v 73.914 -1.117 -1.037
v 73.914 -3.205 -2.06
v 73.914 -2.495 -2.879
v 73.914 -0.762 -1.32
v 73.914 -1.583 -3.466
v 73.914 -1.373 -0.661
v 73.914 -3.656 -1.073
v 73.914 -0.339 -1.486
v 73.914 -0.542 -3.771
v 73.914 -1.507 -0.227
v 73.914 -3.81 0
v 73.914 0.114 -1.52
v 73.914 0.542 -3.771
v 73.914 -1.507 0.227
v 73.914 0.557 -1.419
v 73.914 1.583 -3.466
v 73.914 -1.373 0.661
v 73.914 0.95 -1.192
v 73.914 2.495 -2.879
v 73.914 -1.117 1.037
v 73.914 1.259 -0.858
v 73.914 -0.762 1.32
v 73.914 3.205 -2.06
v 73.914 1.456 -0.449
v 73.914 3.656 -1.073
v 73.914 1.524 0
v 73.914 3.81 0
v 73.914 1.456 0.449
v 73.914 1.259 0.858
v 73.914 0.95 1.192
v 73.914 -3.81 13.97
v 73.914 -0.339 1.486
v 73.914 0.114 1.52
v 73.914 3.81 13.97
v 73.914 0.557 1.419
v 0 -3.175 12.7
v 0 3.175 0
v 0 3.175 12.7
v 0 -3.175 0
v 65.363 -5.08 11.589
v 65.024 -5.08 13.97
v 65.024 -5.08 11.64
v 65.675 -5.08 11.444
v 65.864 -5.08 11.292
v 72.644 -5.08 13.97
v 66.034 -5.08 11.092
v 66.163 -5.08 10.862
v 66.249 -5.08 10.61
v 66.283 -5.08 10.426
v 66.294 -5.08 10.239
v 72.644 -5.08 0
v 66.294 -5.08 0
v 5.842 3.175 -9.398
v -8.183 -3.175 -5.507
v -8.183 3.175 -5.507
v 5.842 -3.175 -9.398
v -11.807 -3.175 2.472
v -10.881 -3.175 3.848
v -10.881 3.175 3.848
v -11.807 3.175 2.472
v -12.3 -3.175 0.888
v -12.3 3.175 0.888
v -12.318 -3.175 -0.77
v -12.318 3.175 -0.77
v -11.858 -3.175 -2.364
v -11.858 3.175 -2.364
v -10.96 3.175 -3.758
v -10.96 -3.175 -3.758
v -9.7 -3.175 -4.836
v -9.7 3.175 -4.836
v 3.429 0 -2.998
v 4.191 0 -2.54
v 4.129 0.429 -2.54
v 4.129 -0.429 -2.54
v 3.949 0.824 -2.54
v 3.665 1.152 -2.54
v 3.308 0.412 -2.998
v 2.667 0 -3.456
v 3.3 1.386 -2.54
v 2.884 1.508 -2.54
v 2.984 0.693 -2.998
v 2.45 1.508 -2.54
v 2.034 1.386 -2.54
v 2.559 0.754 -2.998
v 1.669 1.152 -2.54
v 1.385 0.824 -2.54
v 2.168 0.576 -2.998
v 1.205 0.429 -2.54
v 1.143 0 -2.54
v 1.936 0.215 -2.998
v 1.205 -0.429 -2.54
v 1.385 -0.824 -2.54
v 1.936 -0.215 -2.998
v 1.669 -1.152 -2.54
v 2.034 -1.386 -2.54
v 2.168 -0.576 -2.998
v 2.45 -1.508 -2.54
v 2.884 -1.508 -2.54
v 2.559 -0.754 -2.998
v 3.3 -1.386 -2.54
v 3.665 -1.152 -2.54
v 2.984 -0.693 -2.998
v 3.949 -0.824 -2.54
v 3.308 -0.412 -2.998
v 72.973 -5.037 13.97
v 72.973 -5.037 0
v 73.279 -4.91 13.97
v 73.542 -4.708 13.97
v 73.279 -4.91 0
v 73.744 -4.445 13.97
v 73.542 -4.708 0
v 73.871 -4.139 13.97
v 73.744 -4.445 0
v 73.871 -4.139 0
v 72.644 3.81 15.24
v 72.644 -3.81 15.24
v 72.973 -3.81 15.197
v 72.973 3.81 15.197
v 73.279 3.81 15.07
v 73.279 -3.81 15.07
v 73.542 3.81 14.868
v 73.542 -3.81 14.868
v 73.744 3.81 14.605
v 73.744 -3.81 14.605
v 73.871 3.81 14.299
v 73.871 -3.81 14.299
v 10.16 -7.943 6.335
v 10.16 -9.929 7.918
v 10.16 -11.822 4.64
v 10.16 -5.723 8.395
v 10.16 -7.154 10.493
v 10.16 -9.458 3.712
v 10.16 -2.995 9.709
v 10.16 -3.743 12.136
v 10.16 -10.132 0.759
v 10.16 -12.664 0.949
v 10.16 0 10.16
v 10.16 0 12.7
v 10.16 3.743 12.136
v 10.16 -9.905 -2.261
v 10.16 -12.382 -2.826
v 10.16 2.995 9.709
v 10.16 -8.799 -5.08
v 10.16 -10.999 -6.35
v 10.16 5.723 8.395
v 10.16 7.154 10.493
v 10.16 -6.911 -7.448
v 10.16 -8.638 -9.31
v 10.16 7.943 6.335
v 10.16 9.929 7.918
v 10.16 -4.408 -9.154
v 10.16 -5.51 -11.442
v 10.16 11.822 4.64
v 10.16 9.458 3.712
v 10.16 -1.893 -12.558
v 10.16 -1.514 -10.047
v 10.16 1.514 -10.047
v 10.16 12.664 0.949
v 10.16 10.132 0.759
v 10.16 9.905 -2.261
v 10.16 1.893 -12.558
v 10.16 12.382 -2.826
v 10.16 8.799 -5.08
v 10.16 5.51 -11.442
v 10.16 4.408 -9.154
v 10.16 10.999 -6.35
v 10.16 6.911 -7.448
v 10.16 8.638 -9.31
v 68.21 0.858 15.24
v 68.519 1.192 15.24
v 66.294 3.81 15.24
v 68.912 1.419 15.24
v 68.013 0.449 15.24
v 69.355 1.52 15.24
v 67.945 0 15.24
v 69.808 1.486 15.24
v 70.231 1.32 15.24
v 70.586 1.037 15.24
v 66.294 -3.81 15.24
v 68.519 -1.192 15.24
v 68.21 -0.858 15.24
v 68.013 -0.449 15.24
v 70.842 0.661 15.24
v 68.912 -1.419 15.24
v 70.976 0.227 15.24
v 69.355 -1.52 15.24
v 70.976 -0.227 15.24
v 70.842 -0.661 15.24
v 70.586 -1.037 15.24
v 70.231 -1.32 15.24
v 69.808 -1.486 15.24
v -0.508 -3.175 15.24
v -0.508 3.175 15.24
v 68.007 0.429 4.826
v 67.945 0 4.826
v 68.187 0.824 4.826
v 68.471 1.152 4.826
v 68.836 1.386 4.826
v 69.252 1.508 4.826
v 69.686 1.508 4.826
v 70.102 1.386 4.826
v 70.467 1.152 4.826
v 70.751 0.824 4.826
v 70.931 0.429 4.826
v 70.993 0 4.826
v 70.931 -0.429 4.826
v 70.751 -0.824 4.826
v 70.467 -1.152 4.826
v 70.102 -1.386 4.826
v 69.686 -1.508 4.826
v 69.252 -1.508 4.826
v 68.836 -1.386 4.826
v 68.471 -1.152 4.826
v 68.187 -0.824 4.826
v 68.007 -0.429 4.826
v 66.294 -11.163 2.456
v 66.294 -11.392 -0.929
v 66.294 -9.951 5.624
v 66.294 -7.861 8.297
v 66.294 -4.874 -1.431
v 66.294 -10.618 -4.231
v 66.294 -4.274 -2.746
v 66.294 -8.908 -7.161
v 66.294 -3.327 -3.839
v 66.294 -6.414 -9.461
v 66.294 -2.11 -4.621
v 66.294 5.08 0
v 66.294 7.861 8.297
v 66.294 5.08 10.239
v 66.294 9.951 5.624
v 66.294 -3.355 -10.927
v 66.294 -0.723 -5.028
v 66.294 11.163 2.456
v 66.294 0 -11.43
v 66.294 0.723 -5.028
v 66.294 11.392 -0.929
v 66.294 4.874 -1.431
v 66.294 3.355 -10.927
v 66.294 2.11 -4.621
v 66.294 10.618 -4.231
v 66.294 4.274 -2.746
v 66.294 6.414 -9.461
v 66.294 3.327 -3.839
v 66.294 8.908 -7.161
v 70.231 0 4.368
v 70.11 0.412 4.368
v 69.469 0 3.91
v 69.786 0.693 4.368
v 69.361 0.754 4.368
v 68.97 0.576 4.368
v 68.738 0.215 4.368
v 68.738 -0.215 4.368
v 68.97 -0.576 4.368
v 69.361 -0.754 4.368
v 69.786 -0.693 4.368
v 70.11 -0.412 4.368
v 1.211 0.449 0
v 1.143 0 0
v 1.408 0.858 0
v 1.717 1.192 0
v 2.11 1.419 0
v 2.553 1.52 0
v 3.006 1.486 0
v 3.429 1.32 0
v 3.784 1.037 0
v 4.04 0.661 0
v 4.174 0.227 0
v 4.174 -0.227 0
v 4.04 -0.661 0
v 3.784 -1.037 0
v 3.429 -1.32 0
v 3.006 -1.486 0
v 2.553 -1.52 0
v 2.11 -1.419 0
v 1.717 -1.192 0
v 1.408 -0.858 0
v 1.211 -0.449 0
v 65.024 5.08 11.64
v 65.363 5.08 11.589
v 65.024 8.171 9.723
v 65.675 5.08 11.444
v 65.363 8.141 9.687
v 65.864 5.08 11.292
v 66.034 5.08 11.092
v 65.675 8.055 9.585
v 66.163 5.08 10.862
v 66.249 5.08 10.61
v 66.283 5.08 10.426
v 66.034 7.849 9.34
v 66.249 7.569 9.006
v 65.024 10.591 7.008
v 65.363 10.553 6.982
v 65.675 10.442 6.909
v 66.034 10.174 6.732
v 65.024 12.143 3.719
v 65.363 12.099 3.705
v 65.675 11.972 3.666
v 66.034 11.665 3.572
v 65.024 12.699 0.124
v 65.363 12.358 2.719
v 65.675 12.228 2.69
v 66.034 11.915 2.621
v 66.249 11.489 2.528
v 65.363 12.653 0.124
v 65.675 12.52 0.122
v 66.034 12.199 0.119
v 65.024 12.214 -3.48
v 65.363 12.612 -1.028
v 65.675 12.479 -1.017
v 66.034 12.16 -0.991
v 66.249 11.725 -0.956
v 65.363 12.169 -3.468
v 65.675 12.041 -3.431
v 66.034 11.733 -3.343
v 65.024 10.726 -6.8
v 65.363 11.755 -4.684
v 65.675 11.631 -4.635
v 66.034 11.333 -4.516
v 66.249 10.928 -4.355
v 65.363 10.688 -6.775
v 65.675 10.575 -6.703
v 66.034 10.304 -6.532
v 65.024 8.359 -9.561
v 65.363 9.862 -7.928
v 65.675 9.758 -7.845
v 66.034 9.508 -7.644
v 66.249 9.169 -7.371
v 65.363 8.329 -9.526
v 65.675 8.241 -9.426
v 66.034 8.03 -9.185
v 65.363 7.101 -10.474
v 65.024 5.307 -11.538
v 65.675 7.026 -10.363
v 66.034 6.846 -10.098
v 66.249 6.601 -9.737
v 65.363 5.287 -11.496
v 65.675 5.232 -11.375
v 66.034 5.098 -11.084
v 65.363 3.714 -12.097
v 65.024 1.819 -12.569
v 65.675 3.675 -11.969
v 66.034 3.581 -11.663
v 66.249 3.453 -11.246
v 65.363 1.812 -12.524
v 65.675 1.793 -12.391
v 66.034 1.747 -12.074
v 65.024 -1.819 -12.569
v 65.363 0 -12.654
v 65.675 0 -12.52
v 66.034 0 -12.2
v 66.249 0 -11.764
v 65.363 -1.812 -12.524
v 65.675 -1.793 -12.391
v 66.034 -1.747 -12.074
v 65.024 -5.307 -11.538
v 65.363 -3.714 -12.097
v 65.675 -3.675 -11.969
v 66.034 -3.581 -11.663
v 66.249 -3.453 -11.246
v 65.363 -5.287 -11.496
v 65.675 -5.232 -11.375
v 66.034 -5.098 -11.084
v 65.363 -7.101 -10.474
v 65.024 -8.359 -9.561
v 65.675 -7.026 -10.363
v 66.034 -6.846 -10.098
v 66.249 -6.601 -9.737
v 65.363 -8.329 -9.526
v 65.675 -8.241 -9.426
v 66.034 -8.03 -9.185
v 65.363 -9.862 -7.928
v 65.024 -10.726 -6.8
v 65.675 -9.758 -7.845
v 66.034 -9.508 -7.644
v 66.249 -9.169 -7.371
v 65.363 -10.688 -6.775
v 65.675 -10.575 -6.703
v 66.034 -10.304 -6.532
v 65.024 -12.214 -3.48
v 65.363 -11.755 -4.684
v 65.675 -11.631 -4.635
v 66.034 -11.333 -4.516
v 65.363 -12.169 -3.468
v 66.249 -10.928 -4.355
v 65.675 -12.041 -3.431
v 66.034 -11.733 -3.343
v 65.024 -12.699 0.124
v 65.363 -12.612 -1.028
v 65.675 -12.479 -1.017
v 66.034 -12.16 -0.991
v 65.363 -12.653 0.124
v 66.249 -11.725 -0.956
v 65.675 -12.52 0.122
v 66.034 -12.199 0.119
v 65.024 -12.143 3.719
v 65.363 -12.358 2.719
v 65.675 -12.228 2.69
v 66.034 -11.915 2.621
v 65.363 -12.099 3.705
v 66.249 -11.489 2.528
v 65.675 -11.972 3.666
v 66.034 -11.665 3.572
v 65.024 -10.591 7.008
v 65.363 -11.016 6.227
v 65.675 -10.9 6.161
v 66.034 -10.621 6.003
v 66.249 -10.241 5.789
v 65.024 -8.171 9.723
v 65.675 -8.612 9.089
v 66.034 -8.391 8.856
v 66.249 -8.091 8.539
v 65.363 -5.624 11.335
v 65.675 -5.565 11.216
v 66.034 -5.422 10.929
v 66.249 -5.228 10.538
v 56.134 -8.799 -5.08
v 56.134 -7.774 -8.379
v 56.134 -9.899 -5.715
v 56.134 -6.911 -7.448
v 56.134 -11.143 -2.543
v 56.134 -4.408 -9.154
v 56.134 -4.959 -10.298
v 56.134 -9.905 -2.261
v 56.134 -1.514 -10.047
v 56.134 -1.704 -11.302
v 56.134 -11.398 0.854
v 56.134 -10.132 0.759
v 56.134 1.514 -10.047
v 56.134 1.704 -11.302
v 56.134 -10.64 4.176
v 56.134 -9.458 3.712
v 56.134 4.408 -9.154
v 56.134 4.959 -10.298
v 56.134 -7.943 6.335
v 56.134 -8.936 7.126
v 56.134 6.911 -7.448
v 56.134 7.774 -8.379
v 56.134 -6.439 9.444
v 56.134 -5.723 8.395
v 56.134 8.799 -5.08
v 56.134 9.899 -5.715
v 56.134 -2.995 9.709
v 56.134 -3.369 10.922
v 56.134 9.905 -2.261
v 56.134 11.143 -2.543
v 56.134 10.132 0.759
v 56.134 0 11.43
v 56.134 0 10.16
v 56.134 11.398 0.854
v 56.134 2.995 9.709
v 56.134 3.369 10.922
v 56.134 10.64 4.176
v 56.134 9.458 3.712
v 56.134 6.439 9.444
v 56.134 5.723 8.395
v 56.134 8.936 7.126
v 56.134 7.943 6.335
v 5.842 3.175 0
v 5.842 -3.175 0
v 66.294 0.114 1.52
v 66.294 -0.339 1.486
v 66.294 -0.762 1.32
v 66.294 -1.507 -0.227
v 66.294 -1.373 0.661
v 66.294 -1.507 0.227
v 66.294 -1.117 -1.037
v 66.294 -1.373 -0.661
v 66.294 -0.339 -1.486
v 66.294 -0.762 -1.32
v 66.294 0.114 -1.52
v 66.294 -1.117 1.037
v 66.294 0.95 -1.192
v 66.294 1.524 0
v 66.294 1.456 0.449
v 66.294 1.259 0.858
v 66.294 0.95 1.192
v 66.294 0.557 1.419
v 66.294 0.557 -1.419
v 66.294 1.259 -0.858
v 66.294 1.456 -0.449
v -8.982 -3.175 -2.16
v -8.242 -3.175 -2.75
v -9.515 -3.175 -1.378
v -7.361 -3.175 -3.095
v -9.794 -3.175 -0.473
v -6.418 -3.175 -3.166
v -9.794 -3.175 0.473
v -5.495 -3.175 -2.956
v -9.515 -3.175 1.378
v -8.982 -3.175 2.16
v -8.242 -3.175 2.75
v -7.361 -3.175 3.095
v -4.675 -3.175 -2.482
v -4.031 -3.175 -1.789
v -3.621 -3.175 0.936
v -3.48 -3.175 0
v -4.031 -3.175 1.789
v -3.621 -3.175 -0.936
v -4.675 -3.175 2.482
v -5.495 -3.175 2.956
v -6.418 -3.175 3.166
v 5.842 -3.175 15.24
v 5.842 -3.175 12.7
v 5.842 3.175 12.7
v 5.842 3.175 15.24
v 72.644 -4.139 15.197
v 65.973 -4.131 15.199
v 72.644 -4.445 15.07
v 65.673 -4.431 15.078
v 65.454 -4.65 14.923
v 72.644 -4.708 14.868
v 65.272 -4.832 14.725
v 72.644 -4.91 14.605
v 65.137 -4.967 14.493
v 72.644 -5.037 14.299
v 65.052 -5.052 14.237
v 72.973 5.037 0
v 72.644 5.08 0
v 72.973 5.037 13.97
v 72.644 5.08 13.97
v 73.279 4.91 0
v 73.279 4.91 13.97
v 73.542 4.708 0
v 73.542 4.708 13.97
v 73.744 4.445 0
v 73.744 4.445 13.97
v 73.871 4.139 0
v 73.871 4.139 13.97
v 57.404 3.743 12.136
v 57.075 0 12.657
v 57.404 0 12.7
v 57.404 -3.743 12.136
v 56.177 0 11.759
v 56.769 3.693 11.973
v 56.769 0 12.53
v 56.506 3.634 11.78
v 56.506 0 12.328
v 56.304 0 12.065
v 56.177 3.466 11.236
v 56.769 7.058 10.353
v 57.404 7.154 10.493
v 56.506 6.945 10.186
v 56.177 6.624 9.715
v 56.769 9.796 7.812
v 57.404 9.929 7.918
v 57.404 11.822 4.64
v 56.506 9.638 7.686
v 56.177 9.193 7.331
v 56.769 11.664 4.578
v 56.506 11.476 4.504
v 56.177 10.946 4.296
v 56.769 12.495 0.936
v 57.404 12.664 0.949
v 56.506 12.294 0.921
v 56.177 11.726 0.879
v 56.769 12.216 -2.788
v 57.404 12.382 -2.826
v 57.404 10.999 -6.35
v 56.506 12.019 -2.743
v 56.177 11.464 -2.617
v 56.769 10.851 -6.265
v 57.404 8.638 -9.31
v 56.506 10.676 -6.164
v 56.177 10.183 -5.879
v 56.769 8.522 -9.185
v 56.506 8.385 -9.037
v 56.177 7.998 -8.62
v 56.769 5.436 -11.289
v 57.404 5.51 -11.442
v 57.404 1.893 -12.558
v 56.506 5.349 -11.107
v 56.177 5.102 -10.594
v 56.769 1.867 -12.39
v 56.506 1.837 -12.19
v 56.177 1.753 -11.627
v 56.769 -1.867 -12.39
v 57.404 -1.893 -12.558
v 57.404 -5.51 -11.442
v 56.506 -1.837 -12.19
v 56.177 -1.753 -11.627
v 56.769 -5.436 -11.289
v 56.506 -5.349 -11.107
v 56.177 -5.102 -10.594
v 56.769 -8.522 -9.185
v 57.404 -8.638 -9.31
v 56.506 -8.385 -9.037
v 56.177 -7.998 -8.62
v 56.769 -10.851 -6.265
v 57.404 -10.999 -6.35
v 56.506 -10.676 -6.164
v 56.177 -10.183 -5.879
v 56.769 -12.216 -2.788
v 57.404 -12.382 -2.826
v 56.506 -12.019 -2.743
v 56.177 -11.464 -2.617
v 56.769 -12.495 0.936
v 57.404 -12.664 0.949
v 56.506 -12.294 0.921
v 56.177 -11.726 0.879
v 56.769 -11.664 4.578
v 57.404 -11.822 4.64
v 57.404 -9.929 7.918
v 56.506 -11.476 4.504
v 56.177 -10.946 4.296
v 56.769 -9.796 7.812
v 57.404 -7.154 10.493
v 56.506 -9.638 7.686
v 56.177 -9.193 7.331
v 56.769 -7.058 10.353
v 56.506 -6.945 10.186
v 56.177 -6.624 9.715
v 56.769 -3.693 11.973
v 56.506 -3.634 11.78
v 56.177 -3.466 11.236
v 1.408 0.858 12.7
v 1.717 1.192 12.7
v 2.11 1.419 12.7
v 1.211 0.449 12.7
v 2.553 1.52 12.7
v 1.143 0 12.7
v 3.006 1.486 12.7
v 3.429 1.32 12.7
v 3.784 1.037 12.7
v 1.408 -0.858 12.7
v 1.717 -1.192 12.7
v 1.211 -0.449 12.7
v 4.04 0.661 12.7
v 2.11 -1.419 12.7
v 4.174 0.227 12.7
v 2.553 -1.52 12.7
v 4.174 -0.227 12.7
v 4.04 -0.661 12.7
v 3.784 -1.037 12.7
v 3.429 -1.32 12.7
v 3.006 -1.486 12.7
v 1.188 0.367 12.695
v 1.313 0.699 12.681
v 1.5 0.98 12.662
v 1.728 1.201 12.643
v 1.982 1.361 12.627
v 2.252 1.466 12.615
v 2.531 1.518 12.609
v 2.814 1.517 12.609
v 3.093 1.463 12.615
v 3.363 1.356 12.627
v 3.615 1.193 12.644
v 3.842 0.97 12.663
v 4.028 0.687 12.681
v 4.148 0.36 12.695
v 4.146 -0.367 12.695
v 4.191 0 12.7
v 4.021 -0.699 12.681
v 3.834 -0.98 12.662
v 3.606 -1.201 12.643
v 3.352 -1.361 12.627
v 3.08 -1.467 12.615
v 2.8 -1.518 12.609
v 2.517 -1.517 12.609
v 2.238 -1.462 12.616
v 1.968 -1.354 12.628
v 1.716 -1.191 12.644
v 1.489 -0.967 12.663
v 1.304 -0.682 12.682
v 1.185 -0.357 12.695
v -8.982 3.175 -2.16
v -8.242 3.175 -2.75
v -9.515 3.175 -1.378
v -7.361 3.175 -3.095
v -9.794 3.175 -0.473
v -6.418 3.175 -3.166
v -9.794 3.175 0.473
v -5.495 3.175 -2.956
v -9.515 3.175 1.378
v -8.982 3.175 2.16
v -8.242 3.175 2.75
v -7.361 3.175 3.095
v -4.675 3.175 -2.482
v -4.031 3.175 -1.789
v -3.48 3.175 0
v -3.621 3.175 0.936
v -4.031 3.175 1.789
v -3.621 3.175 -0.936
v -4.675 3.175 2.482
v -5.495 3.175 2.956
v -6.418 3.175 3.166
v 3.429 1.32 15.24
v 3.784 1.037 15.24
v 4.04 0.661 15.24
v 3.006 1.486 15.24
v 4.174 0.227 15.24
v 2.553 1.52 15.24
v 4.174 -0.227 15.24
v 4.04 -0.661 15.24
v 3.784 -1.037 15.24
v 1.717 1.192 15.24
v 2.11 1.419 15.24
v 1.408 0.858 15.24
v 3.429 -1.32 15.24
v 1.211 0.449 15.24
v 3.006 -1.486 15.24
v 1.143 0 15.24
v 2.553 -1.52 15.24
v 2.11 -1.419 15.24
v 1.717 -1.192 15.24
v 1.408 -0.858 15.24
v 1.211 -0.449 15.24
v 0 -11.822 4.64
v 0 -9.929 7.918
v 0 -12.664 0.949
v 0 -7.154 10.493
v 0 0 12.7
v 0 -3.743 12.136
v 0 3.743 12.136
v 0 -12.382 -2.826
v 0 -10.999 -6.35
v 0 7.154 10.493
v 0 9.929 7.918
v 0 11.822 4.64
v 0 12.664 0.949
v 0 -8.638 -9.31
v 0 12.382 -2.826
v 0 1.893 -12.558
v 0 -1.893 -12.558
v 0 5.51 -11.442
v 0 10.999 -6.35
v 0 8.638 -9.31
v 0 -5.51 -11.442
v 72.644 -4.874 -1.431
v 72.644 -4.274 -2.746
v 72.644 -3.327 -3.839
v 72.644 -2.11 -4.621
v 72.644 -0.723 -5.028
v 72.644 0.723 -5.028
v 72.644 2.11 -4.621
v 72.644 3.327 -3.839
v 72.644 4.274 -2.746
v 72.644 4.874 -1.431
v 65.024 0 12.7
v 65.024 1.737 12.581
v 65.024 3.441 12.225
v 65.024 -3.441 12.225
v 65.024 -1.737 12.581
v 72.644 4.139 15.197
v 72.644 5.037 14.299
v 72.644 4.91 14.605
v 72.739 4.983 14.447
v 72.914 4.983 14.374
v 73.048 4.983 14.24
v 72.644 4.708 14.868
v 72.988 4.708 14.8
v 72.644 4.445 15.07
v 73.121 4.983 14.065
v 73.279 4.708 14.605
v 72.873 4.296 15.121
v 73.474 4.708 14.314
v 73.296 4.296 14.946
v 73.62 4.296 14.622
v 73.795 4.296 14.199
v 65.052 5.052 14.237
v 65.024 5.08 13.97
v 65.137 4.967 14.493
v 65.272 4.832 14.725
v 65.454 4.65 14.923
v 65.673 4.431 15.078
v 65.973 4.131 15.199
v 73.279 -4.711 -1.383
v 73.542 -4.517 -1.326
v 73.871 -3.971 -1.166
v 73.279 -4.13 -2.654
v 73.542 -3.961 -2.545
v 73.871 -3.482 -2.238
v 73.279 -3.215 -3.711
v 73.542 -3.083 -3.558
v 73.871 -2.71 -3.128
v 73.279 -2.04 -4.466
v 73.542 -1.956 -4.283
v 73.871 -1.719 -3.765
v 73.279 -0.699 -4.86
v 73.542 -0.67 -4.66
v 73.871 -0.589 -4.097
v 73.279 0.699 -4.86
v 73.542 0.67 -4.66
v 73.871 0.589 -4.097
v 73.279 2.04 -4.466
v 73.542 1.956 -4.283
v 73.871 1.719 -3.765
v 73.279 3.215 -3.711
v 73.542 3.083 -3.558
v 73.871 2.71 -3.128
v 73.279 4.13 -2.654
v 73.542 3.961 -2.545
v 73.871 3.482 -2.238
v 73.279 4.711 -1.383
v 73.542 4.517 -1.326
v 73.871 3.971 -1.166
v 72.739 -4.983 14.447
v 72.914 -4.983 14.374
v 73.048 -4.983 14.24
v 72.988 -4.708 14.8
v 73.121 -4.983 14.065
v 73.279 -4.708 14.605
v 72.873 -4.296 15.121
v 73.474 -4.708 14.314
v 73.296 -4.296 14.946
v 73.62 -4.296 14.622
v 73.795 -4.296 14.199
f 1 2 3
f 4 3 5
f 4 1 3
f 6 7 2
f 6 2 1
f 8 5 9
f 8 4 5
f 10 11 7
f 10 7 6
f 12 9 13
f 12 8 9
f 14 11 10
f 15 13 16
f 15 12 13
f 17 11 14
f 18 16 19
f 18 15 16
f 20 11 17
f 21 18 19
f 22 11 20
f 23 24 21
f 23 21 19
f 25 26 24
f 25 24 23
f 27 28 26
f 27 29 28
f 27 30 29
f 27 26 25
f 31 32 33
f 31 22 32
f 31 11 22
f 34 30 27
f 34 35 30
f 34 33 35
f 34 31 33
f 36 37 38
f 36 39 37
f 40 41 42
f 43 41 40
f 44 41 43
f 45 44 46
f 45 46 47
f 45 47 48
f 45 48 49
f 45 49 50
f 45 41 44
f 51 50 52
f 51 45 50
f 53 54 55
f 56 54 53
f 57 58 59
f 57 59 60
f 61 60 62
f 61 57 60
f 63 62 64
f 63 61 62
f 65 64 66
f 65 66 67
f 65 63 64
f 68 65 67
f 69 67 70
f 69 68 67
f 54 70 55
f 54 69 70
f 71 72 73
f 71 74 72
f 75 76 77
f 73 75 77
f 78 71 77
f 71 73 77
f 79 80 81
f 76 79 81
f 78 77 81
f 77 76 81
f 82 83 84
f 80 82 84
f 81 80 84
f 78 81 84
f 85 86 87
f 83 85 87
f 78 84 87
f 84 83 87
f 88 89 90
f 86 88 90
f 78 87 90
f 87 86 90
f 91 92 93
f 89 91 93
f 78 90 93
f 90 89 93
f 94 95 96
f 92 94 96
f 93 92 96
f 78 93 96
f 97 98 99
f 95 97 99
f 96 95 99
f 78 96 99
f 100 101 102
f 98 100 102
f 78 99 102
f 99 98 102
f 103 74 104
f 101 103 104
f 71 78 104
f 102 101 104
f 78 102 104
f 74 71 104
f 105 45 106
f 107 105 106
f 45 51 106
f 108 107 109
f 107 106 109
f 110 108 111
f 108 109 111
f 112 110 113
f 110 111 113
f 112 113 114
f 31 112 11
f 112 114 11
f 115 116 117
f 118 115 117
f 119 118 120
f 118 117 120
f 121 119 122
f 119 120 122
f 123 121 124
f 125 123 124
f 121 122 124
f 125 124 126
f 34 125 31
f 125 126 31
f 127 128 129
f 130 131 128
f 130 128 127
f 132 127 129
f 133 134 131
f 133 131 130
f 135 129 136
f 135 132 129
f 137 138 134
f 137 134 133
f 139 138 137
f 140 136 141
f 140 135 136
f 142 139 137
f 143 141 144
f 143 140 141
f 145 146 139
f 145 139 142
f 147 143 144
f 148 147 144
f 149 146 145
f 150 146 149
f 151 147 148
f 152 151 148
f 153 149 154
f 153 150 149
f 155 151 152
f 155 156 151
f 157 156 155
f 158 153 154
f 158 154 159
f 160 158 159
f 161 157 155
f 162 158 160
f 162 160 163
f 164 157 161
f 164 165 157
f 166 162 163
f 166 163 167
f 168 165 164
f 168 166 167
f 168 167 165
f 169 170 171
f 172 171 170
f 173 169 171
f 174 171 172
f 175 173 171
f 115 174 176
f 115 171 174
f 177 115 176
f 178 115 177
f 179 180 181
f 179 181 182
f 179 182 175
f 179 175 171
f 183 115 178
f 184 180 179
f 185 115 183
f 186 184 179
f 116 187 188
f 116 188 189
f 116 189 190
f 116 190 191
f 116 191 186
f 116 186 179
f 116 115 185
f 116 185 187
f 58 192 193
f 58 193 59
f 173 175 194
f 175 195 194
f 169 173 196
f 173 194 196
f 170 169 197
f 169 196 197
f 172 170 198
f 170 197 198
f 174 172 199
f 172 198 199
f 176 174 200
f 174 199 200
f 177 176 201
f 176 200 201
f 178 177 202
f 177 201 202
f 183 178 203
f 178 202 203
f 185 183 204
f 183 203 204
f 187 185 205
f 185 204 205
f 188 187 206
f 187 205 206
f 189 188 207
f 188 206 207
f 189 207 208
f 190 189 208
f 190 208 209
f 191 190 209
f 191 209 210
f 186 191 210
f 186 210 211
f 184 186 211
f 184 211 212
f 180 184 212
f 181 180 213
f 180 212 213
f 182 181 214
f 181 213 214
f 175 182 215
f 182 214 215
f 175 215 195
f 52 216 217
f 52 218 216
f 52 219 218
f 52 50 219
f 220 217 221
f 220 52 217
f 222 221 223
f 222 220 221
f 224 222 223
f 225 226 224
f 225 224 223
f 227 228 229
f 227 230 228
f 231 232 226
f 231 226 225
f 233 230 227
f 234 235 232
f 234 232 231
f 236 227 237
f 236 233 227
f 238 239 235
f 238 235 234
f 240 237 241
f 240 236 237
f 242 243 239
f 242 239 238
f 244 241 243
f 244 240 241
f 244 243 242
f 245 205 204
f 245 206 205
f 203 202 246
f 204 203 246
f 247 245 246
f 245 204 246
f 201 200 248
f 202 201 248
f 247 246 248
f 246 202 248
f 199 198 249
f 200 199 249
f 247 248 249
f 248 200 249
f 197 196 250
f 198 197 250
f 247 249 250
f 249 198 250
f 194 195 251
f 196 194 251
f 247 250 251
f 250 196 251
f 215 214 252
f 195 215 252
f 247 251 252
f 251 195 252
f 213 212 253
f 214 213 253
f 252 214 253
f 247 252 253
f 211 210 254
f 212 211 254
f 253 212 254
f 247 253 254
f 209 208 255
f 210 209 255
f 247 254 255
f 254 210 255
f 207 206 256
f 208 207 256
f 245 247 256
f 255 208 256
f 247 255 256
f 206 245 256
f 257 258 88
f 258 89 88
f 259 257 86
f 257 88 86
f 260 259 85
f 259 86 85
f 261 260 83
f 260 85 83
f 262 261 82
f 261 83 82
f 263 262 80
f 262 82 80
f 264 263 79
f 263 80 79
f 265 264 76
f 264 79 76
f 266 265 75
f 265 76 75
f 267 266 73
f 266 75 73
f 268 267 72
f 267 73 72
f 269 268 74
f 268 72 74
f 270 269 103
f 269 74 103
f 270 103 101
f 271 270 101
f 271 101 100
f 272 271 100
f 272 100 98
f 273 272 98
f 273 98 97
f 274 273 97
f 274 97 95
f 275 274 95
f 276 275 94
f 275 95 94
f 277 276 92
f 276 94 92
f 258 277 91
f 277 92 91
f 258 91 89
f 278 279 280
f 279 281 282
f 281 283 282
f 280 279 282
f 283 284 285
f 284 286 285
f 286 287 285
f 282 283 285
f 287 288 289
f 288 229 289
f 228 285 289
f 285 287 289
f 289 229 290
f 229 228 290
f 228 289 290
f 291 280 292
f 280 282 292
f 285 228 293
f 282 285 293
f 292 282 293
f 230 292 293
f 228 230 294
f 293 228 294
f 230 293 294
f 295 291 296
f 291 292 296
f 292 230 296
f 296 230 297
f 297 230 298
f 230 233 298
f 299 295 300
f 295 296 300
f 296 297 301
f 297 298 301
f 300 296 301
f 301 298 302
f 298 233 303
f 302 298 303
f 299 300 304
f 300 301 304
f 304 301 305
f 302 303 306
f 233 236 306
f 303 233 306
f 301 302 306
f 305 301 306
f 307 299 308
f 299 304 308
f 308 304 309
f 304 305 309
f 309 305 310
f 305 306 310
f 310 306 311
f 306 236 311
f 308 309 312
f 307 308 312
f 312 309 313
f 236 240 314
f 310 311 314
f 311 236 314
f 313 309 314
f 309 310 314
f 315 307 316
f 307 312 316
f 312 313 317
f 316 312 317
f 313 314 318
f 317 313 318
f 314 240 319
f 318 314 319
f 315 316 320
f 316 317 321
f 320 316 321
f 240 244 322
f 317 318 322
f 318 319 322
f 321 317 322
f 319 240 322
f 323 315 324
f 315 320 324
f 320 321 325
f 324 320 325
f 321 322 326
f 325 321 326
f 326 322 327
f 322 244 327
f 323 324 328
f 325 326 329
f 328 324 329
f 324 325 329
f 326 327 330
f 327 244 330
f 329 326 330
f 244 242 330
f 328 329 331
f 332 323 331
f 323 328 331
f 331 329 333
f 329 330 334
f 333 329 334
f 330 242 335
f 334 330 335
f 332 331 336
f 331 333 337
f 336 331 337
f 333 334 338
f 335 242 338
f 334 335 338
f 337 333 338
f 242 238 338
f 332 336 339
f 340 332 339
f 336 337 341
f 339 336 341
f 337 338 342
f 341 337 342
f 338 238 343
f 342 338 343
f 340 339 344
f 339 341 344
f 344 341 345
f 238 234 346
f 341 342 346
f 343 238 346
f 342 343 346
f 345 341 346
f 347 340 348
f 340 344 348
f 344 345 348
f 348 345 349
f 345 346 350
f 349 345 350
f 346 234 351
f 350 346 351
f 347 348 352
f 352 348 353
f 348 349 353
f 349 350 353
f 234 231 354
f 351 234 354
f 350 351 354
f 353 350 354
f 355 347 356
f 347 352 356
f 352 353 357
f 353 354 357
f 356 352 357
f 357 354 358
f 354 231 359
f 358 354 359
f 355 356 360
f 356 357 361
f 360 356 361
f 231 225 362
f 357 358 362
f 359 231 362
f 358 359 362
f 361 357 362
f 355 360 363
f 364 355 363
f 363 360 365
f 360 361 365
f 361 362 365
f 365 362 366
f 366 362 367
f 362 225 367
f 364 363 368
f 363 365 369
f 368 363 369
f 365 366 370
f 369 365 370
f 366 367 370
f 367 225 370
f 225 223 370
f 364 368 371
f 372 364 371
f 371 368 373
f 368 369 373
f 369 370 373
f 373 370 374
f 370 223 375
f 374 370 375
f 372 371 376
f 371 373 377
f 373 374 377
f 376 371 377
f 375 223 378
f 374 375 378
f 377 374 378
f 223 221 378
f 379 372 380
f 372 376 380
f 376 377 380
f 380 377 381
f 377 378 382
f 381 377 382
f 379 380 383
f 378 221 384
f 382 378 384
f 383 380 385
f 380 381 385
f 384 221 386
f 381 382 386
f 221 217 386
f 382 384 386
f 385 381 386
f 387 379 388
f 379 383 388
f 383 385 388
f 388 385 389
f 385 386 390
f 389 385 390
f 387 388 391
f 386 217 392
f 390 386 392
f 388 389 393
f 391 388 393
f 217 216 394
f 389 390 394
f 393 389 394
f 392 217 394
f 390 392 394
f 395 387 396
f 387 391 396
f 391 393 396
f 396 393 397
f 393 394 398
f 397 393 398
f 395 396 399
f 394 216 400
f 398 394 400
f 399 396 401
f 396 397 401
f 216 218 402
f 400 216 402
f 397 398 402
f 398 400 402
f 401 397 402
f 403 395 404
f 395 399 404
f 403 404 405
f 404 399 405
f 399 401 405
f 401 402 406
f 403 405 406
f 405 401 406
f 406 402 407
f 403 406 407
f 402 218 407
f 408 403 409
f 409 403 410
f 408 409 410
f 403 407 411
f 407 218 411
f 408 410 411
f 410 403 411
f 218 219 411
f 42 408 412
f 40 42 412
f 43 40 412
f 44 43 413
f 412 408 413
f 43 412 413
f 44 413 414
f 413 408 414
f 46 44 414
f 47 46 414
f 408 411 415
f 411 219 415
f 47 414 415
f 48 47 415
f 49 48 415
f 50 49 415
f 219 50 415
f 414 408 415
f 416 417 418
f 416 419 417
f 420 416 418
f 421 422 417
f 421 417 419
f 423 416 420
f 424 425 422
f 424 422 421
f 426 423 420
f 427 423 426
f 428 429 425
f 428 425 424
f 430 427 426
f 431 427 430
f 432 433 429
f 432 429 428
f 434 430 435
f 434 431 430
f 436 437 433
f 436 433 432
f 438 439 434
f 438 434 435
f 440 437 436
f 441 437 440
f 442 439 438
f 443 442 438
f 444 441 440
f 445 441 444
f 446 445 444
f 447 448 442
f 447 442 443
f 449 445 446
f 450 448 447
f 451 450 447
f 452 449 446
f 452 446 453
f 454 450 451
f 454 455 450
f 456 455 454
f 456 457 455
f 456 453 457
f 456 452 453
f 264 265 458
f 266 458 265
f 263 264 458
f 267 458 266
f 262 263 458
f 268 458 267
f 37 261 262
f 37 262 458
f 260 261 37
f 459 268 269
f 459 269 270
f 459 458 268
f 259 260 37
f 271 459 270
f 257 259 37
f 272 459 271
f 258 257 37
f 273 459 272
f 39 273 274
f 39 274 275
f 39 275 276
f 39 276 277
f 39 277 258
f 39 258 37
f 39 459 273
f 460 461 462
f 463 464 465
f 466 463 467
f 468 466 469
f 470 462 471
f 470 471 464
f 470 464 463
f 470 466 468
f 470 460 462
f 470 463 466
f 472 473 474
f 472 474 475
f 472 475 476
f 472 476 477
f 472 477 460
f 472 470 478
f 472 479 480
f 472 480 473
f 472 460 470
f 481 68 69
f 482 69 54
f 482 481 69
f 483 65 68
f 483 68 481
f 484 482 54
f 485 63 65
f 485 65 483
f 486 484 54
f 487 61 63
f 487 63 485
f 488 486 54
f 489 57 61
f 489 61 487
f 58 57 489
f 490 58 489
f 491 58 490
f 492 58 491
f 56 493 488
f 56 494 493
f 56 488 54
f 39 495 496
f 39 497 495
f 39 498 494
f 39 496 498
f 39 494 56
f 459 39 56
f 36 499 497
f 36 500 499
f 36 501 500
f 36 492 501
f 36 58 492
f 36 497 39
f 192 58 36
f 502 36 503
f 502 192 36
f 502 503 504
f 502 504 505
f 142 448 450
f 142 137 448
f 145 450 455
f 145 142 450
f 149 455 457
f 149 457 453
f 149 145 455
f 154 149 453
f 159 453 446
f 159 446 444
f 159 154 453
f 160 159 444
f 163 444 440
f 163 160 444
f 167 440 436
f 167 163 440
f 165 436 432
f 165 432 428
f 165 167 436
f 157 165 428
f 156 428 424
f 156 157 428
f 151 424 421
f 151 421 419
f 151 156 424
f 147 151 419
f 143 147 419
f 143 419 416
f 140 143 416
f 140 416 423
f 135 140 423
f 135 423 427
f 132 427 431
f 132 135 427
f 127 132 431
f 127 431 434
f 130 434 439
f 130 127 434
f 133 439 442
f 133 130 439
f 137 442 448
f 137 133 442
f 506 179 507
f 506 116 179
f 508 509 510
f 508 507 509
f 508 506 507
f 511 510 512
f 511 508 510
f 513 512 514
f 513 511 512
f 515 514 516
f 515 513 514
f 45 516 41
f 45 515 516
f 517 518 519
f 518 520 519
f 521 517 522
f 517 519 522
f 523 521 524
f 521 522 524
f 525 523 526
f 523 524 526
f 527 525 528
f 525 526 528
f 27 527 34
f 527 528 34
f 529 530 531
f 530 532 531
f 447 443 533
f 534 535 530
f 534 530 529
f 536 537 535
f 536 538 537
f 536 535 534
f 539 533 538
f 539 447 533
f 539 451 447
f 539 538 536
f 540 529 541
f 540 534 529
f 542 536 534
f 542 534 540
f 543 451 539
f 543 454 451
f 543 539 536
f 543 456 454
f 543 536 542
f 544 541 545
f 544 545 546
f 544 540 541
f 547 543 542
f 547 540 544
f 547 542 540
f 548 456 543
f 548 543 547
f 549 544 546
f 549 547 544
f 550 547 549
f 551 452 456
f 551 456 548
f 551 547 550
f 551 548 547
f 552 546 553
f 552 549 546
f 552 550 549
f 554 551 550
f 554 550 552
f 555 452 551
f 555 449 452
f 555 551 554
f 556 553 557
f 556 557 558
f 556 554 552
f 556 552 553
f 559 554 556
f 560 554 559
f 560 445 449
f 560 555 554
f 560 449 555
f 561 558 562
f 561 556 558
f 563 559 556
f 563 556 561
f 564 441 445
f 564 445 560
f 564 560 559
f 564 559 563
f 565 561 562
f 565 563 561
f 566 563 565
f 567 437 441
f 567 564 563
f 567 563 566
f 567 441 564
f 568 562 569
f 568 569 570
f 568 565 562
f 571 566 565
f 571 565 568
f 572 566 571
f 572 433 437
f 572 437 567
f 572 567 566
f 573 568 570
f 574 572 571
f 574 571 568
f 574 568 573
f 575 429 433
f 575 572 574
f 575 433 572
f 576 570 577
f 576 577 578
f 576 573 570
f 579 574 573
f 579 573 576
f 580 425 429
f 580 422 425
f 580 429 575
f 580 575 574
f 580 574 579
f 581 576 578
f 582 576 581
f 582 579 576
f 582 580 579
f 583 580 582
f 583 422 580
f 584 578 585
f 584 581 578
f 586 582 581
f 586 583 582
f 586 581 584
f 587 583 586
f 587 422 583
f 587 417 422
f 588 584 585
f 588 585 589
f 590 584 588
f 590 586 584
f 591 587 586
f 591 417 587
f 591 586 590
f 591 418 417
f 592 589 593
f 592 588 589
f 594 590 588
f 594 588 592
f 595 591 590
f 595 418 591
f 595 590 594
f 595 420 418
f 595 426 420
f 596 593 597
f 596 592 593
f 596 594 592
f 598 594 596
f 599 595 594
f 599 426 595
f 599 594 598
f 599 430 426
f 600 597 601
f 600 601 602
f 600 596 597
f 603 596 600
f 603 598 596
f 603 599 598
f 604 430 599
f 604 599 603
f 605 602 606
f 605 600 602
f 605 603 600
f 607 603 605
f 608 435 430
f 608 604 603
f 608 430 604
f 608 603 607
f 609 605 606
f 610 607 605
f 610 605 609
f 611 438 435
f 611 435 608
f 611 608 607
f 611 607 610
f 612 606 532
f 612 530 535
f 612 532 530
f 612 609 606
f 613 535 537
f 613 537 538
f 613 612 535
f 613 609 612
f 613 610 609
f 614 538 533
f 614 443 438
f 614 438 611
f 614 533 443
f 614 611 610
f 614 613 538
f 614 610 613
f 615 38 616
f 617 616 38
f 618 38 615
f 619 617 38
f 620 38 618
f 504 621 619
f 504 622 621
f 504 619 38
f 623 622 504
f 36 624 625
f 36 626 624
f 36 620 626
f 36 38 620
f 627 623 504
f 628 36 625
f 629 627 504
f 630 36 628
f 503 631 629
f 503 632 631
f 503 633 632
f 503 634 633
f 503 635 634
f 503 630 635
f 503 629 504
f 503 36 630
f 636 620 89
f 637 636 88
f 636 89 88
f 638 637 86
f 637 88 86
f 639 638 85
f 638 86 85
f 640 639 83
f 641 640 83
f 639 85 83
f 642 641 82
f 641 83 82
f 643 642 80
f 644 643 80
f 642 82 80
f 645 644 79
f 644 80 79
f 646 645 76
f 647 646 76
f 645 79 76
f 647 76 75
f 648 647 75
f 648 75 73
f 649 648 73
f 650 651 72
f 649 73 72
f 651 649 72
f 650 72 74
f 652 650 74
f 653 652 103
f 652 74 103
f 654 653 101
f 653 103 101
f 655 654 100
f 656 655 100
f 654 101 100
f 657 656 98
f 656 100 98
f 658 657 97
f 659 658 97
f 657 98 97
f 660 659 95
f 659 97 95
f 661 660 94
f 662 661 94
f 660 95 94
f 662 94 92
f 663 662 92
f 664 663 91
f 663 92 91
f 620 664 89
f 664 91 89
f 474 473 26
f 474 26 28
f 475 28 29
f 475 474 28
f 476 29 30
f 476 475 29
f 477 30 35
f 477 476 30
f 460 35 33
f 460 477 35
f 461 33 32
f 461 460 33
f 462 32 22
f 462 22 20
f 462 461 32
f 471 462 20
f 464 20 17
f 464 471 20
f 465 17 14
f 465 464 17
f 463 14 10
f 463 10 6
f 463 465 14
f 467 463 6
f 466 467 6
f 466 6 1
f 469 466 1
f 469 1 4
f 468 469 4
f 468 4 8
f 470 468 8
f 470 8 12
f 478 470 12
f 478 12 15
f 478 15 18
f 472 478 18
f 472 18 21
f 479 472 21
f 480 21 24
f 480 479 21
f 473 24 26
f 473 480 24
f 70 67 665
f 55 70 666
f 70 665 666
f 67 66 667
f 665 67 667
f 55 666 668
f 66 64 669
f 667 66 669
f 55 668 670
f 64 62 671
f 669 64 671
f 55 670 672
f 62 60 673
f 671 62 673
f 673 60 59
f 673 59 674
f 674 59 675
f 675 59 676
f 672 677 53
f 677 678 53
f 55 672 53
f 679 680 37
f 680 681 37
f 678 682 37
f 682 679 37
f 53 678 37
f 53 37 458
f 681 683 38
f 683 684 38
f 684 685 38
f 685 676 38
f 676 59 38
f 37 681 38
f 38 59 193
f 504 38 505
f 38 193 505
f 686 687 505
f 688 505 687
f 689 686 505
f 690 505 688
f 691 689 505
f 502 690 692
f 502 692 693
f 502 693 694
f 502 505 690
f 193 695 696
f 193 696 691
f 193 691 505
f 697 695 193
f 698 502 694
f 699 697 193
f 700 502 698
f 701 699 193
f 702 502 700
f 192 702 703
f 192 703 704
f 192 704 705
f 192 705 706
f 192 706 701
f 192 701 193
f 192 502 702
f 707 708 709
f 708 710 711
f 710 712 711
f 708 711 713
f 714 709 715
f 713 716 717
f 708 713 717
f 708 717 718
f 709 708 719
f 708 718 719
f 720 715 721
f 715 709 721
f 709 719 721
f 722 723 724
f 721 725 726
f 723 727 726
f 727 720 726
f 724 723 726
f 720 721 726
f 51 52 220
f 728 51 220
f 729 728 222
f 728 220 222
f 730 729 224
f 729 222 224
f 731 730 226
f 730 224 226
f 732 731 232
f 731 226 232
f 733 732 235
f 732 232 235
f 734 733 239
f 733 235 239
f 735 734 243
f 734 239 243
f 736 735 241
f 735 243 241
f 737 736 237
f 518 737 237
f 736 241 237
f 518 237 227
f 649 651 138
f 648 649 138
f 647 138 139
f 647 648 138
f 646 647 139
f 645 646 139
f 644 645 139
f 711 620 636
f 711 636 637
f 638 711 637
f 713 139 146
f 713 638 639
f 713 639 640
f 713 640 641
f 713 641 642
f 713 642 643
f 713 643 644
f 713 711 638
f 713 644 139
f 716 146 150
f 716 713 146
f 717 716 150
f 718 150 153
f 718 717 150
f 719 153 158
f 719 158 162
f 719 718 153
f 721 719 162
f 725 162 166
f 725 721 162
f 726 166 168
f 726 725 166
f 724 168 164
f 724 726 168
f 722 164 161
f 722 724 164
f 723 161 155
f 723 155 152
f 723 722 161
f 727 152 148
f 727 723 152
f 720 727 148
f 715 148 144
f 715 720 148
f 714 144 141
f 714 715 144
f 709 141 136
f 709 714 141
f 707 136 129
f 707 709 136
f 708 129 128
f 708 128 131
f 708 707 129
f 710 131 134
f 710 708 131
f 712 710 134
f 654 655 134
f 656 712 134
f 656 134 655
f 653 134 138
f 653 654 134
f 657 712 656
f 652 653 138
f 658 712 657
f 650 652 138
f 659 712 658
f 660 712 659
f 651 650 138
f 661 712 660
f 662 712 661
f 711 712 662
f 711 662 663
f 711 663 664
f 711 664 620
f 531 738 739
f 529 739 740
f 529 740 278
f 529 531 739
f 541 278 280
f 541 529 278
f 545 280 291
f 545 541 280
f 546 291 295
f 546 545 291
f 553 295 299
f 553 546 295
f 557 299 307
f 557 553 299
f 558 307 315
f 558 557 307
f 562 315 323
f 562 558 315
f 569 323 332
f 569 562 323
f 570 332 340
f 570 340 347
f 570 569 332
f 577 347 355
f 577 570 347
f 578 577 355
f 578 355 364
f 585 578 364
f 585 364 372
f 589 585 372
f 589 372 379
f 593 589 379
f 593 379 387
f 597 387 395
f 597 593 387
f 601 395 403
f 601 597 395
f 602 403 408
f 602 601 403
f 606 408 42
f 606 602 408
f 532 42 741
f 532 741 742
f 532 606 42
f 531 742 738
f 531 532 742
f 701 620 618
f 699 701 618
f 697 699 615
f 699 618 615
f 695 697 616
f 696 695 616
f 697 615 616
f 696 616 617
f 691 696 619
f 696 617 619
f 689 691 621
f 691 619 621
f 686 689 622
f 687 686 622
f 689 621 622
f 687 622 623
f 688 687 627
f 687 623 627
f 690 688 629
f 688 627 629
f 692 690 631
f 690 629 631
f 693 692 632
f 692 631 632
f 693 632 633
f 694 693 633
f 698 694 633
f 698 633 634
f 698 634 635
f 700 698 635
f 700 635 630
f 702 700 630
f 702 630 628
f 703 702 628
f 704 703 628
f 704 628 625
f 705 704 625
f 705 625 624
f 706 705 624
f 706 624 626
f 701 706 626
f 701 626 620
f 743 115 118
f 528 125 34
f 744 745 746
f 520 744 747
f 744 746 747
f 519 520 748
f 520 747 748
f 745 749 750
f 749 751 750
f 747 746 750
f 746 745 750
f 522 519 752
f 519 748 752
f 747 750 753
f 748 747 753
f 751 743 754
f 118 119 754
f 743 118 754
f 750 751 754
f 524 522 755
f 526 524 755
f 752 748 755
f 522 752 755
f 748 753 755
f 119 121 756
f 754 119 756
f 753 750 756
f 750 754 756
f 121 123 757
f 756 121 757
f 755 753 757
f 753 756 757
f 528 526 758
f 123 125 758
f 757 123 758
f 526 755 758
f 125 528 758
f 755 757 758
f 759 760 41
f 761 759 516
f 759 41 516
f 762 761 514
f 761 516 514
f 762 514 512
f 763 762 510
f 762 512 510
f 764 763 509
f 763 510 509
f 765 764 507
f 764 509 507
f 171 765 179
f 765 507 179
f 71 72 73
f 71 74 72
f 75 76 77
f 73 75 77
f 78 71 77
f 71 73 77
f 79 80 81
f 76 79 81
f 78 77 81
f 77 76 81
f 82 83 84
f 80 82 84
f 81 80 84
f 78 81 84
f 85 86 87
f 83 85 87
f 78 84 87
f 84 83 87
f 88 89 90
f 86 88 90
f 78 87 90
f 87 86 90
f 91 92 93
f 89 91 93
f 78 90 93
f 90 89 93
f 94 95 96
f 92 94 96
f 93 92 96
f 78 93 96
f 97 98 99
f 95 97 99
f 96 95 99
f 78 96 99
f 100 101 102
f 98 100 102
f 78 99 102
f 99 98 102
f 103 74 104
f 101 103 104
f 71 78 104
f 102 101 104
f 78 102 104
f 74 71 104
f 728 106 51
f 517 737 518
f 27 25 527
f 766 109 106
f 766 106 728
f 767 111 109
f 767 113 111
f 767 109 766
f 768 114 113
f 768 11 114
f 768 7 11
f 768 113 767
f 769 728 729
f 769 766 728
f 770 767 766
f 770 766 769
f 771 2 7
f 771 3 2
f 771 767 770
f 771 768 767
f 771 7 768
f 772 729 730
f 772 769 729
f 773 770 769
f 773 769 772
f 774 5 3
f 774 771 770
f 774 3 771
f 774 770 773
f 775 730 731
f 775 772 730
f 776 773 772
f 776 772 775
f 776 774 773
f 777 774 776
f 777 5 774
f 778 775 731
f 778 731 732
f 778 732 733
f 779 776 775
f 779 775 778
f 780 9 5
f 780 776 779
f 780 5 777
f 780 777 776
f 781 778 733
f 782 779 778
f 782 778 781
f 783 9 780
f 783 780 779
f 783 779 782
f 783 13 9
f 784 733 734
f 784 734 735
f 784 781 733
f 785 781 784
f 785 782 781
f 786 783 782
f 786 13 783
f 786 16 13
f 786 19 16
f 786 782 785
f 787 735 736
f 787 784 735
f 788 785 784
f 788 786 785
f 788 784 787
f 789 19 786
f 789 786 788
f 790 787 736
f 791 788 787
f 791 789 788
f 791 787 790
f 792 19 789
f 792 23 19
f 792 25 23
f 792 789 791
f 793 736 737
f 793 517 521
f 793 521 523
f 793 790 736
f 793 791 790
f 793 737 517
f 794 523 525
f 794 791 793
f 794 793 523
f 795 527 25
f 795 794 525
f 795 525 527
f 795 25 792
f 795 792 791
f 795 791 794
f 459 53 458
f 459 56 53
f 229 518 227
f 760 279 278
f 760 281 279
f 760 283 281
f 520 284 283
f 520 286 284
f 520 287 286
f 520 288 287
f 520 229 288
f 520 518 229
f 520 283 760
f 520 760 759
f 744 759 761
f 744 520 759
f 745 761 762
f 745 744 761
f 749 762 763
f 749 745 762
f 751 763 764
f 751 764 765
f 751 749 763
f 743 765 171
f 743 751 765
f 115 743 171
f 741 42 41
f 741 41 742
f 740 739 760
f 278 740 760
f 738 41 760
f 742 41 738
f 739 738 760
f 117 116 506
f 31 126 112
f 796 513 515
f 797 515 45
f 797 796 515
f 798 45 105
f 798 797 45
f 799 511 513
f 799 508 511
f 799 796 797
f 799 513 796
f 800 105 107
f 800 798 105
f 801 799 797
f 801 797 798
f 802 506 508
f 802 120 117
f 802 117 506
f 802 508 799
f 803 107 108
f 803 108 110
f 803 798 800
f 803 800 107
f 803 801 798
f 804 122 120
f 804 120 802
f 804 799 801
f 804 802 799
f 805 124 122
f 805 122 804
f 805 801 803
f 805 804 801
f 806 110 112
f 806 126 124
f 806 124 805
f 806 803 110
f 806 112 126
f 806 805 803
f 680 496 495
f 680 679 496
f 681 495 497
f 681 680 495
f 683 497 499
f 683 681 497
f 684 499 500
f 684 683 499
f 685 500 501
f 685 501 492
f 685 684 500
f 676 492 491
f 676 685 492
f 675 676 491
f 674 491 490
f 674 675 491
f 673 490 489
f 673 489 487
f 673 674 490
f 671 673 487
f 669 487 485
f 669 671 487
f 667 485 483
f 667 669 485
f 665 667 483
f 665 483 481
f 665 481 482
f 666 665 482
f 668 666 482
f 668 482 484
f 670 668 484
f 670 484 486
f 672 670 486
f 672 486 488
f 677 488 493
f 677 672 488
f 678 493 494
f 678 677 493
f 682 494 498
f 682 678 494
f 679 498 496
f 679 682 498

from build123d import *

# Parameters (mm, degrees)
F0_W       = 5.842
F0_H       = 12.7
F0_R       = 3.175
F2_DEPTH   = 3.175
F3_R       = 1.524
F4_DEPTH   = 7.62
F5_DEPTH   = 1.27
F7_D       = 3.048
F7_DEPTH   = 17.78
F7_TIP     = 0.9157115834
F7_2_D     = 3.048
F7_2_DEPTH = 17.78
F7_2_TIP   = 0.9157115834
F9_D       = 3.048
F9_DEPTH   = 10.414
F9_TIP     = 0.9157115834
F10_R      = 1.27


with BuildPart() as f1:
    # F0 (on Front) → F1 (revolve)
    with BuildSketch(Plane.XZ):
        with Locations((2.921, 6.35)):
            Rectangle(F0_W, F0_H)
        Polygon((5.842, 12.7), (5.842, 0), (66.294, 0), (66.294, 12.7), (56.134, 12.7), (56.134, 10.16), (10.16, 10.16), (10.16, 12.7), align=None)
    revolve(axis=Axis((33.147, 0, 0), (-1, 0, 0)))

    # F3 (on face) → F4 (join)
    with BuildSketch(Plane.YZ.offset(66.294)):
        with BuildLine():
            ThreePointArc((-5.08, 0), (0, 5.08), (5.08, 0))
            Line((5.08, 0), (5.08, 11.6397422652))
            ThreePointArc((5.08, 11.6397422652), (0, 12.7), (-5.08, 11.6397422652))
            Line((-5.08, 11.6397422652), (-5.08, 0))
        make_face()
        with BuildLine():
            ThreePointArc((-5.08, 11.6397422652), (0, 12.7), (5.08, 11.6397422652))
            Line((5.08, 11.6397422652), (5.08, 15.24))
            Line((5.08, 15.24), (-5.08, 15.24))
            Line((-5.08, 15.24), (-5.08, 11.6397422652))
        make_face()
        with BuildLine():
            ThreePointArc((-5.08, 0), (0, -5.08), (5.08, 0))
            ThreePointArc((5.08, 0), (0, 5.08), (-5.08, 0))
        make_face()
        Circle(F3_R, mode=Mode.SUBTRACT)
    extrude(amount=F4_DEPTH)

    # F5 (add): a face of the model
    f5_faces = [f1.faces().sort_by_distance(p)[0] for p in [
        (66.294, 0, 13.7792682875),
    ]]
    extrude(f5_faces, amount=F5_DEPTH)

    # F7
    with Locations(Plane.XY.offset(15.24)):
        with Locations((2.667, 0)):
            Hole(F7_D / 2, depth=F7_DEPTH)
            with Locations((0, 0, -(F7_DEPTH + F7_TIP / 2))):  # 118° drill point
                Cone(0, F7_D / 2, F7_TIP, mode=Mode.SUBTRACT)

    # F9
    with Locations(Plane.XY.offset(15.24)):
        with Locations((69.469, 0)):
            Hole(F9_D / 2, depth=F9_DEPTH)
            with Locations((0, 0, -(F9_DEPTH + F9_TIP / 2))):  # 118° drill point
                Cone(0, F9_D / 2, F9_TIP, mode=Mode.SUBTRACT)

    # F10
    f10_edges = [f1.edges().sort_by_distance(p)[0] for p in [
        (66.294, 0, -12.7),
        (56.134, 0, -12.7),
        (73.914, 0, 15.24),
        (65.024, 0, 15.24),
        (69.469, -5.08, 15.24),
        (69.469, 5.08, 15.24),
        (73.914, -5.08, 7.62),
    ]]
    fillet(f10_edges, radius=F10_R)


with BuildPart() as f2:
    # F0 (on Front) → F2 (new body, symmetric)
    with BuildSketch(Plane.XZ):
        with BuildLine():
            Line((-0.9398, 0), (0, 0))
            Line((0, 0), (0, 12.7))
            Line((0, 12.7), (5.842, 12.7))
            Line((5.842, 12.7), (5.842, 15.24))
            Line((5.842, 15.24), (-0.508, 15.24))
            Line((-0.508, 15.24), (-10.8806298187, 3.8475430269))
            ThreePointArc((-10.8806298187, 3.8475430269), (-4.5919612295, 5.3297205562), (-0.9398, 0))
        make_face()
        with BuildLine():
            ThreePointArc((-8.1826630726, -5.5069827884), (-3.1957909266, -4.5493385486), (-0.9398, 0))
            ThreePointArc((-0.9398, 0), (-4.5919612295, 5.3297205562), (-10.8806298187, 3.8475430269))
            ThreePointArc((-10.8806298187, 3.8475430269), (-12.1459778134, -1.5837270034), (-8.1826630726, -5.5069827884))
        make_face()
        with Locations((-6.6548, 0)):
            Circle(F0_R, mode=Mode.SUBTRACT)
        with BuildLine():
            Line((5.842, 0), (0, 0))
            Line((0, 0), (-0.9398, 0))
            ThreePointArc((-0.9398, 0), (-3.1957909266, -4.5493385486), (-8.1826630726, -5.5069827884))
            Line((-8.1826630726, -5.5069827884), (5.842, -9.398))
            Line((5.842, -9.398), (5.842, 0))
        make_face()
    extrude(amount=F2_DEPTH, both=True)

    # F7#2
    with Locations(Plane.XY.offset(15.24)):
        with Locations((2.667, 0)):
            Hole(F7_2_D / 2, depth=F7_2_DEPTH)
            with Locations((0, 0, -(F7_2_DEPTH + F7_2_TIP / 2))):  # 118° drill point
                Cone(0, F7_2_D / 2, F7_2_TIP, mode=Mode.SUBTRACT)


solid = Compound([f1.part, f2.part])
